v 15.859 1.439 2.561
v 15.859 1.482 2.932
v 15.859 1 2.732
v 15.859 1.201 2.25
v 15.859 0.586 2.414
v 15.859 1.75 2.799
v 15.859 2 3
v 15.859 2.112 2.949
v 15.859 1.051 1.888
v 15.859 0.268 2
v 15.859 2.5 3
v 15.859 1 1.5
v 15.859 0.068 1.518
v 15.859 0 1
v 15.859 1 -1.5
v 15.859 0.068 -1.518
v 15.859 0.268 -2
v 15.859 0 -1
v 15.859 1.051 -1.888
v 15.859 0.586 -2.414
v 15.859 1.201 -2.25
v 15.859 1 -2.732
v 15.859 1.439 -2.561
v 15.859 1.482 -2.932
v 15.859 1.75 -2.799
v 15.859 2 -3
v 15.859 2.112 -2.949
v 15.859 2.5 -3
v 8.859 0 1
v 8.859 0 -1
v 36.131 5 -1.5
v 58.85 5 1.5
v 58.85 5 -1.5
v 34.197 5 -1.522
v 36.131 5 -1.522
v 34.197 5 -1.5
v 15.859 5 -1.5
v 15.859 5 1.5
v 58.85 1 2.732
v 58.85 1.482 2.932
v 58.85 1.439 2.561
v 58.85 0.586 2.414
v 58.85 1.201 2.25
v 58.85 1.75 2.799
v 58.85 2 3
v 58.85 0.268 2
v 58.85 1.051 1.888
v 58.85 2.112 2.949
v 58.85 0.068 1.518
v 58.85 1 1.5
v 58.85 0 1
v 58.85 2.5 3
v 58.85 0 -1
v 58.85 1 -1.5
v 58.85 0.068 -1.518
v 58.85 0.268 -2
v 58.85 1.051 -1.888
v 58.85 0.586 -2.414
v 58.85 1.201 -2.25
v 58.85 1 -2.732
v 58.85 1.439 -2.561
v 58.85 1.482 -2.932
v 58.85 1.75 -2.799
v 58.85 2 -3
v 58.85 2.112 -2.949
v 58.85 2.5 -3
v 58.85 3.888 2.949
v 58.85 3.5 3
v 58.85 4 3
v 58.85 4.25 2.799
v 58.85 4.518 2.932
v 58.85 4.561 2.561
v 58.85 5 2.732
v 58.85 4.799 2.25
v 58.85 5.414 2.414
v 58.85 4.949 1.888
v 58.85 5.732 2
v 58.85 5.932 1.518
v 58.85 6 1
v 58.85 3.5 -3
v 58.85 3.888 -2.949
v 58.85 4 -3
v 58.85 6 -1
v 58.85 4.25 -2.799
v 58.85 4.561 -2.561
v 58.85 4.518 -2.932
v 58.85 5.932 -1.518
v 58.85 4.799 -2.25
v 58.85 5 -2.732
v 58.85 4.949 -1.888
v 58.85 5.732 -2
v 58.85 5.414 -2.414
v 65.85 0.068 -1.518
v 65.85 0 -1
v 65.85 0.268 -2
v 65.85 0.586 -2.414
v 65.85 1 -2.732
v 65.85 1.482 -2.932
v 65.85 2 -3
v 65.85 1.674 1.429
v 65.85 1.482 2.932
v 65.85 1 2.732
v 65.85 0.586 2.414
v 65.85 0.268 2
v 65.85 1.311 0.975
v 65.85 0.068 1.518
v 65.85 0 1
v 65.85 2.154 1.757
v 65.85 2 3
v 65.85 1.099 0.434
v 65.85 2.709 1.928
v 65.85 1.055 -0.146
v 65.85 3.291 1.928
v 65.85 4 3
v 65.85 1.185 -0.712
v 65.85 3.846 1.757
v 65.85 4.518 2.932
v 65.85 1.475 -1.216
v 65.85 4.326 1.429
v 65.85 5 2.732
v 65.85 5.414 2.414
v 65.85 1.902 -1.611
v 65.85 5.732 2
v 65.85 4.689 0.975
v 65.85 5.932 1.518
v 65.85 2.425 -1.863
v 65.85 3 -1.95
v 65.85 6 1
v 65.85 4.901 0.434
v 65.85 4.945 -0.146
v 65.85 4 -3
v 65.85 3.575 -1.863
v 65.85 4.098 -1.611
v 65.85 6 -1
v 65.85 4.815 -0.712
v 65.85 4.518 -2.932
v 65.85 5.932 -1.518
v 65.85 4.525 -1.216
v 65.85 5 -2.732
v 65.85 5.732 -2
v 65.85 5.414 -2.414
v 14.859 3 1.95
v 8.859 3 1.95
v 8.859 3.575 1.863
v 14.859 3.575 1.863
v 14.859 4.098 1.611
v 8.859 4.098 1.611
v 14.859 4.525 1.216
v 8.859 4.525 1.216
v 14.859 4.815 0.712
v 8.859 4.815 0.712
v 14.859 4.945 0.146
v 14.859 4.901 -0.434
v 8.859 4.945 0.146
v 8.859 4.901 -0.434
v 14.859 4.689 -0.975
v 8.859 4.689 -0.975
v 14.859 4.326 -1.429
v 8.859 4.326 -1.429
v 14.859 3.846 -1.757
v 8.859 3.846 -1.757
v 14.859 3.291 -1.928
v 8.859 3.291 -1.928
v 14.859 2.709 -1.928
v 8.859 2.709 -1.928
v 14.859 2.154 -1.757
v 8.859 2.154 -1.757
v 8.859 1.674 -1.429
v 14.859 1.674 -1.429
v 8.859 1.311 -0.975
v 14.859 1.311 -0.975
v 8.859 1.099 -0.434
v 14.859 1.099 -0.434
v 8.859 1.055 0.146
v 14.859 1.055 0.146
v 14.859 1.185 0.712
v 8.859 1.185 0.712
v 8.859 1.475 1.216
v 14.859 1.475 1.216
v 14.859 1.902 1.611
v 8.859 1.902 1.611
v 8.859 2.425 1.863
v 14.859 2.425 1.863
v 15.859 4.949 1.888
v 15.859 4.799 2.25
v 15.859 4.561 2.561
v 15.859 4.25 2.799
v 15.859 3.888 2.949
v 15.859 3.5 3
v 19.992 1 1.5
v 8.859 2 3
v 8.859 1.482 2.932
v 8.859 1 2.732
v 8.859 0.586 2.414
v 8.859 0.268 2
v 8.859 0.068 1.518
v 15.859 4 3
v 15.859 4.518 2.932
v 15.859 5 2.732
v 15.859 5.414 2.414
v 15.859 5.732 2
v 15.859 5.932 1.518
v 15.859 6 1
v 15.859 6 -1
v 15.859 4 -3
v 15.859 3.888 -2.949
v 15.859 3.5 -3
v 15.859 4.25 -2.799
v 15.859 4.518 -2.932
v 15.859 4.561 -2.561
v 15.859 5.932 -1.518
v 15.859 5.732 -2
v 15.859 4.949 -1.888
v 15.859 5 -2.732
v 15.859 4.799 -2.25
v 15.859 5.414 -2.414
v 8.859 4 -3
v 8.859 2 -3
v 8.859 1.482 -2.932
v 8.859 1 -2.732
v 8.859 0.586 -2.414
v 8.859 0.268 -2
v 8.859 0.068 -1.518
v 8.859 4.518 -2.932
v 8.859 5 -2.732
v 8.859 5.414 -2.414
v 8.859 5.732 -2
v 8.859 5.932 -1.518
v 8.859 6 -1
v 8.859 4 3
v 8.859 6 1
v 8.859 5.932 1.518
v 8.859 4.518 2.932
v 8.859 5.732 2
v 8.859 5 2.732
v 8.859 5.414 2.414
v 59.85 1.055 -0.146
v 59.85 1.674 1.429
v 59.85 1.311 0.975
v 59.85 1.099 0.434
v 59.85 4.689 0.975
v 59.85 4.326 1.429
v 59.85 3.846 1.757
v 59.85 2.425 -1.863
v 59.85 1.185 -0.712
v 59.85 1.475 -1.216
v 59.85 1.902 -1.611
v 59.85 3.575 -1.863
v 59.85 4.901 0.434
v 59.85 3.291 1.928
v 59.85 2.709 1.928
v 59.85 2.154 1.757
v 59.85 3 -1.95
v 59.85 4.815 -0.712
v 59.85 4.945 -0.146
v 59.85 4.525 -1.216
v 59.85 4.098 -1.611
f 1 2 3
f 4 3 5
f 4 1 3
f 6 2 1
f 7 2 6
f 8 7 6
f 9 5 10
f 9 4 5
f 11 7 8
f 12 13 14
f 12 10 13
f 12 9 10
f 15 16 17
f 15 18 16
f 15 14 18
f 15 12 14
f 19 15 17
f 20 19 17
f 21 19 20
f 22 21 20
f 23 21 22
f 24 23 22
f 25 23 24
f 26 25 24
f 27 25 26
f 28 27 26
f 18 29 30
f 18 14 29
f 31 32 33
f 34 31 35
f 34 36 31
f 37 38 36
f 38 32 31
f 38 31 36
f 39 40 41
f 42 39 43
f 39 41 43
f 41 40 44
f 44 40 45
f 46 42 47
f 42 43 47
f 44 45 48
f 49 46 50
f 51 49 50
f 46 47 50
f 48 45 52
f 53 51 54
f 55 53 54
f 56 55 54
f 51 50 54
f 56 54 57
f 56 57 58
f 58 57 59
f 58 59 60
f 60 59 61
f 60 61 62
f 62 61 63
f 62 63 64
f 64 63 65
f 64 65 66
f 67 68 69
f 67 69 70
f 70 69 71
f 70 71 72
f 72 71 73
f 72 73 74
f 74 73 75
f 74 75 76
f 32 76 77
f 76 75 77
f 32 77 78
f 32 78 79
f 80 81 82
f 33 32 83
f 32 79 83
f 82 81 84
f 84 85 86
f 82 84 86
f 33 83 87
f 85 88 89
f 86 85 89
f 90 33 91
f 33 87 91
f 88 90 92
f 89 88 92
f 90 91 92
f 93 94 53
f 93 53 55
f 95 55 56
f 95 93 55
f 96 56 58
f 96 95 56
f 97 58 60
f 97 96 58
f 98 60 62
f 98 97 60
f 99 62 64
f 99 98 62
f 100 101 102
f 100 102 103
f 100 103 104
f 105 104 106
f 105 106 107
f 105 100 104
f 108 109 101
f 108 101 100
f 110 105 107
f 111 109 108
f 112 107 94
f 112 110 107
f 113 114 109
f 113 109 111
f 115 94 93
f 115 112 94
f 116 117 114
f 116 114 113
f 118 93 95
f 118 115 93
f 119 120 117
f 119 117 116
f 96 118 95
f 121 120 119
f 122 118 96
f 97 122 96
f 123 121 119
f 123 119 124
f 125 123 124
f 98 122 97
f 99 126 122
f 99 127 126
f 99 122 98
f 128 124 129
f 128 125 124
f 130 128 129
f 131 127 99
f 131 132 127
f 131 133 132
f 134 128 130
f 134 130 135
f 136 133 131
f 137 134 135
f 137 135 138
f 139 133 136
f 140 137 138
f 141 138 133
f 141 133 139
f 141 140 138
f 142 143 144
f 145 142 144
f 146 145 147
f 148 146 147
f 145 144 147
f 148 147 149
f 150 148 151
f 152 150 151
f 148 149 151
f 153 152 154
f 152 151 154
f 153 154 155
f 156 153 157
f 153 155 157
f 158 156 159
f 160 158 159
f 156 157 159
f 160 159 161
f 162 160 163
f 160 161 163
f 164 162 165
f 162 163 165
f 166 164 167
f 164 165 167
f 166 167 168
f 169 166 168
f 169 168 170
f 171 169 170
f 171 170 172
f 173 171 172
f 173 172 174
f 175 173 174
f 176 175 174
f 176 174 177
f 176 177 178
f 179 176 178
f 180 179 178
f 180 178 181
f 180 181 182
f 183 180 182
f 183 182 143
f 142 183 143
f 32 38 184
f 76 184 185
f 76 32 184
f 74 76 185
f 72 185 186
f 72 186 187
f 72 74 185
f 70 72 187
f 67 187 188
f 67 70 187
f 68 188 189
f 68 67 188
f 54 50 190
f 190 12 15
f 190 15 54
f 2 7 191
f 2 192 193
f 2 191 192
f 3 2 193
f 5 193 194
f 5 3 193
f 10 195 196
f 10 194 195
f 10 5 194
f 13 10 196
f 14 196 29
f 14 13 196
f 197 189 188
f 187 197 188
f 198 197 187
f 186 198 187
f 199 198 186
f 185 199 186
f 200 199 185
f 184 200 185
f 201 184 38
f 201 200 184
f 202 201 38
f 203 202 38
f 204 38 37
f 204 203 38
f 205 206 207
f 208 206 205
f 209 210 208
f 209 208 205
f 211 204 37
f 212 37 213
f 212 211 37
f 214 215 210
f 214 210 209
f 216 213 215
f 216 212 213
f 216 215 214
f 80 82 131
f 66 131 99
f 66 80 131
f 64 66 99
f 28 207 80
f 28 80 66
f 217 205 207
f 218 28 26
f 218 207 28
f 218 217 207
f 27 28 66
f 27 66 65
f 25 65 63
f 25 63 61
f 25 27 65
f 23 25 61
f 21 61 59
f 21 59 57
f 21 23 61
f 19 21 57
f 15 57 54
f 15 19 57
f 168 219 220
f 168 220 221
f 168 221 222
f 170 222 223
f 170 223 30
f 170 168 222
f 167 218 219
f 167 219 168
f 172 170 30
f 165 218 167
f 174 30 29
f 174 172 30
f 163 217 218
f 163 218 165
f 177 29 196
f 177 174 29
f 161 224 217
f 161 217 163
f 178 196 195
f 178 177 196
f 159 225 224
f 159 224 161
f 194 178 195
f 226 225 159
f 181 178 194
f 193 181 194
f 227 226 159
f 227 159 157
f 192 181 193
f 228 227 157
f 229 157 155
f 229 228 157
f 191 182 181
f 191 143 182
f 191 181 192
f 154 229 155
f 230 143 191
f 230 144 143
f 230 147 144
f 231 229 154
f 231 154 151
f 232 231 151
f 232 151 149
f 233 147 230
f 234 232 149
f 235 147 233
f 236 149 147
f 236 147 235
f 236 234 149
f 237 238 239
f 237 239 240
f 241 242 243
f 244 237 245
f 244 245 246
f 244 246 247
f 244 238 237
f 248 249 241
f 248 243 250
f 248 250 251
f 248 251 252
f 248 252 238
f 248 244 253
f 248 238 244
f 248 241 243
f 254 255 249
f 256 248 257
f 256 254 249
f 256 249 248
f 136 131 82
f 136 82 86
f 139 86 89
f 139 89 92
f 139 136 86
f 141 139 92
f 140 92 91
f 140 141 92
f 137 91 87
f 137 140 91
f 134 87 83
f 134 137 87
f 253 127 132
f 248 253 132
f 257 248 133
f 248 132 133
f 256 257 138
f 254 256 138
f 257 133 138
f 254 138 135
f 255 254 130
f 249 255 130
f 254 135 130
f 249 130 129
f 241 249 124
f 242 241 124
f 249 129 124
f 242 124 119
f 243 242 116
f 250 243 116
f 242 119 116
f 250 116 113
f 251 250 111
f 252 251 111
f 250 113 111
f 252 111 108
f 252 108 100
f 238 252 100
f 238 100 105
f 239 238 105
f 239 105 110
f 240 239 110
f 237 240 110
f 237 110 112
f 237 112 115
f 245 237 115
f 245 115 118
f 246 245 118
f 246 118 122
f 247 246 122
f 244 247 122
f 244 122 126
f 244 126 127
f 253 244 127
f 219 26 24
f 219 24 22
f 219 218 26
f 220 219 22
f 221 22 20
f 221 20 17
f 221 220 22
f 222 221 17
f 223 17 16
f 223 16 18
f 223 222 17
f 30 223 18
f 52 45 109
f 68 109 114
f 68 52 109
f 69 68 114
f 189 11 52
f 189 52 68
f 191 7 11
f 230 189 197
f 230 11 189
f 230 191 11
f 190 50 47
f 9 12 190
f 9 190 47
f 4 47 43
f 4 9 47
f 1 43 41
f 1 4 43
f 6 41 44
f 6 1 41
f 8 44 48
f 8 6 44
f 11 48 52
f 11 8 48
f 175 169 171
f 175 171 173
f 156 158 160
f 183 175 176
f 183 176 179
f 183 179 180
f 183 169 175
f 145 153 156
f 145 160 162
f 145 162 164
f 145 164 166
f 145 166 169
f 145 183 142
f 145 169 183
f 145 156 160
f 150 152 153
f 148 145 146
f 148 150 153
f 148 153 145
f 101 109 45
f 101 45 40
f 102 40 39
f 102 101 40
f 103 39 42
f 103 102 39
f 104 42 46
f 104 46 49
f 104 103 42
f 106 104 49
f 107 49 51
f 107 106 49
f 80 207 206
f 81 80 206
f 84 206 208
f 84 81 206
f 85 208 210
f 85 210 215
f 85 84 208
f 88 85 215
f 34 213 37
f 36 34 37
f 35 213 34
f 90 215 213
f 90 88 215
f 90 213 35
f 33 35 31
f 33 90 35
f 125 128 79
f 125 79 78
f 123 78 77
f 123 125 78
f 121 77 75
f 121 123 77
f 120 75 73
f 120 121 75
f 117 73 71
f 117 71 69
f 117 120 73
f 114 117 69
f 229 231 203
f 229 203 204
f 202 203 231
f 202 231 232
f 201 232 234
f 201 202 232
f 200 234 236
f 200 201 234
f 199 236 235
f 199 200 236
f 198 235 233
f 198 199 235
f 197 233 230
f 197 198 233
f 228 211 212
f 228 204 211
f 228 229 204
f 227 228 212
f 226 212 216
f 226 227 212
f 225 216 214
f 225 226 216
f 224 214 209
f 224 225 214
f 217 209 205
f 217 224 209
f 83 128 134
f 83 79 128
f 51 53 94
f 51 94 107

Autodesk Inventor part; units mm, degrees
ref_plane "YZ Plane" through (0, 0, 0) normal (1, 0, 0) x (0, 1, 0)
ref_plane "XZ Plane" through (0, 0, 0) normal (0, 1, 0) x (-1, 0, 0)
ref_plane "XY Plane" through (0, 0, 0) normal (0, 0, 1) x (1, 0, 0)
sketch "Sketch1" plane through (0, 0, 0) normal (0, 1, 0) x (-1, 0, 0)
  point P0 (0, 0)
sketch "Sketch2" plane through (0, 0, 0) normal (0, 1, 0) x (-1, 0, 0)
  circle A0 centre (0, 0) radius 3.85
  dimension "d0" = 7.7
extrude "Extrusion1" add sketch "Sketch2" along normal blind 6
sketch "Sketch3" plane through (0, 6, 0) normal (0, 1, 0) x (1, 0, 0)
  circle A0 centre (0, 0) radius 1
  dimension "d3" = 2
extrude "Extrusion2" cut sketch "Sketch3" against normal through all
sketch "Sketch4" plane through (0, 0, 0) normal (0, -1, 0) x (1, 0, 0)
  circle A0 centre (0, 0) radius 3.85 projected
  line L0 (0, 3.85) -> (3.85, 3.85)
  line L1 (3.85, 3.85) -> (3.85, -3.85)
  line L2 (3.85, -3.85) -> (0, -3.85)
  line L3 (3.85, 3.85) -> (4.85, 3.85)
  line L4 (4.85, 3.85) -> (4.85, -3.85)
  line L5 (4.85, -3.85) -> (3.85, -3.85)
  line L6 (3.85, -3.85) -> (3.85, 3.85)
  line L7 (4.85, 3.85) -> (4.85, 3)
  line L8 (4.85, -3.85) -> (4.85, -3)
  line L9 (4.85, 3) -> (3.85, 3)
  line L10 (3.85, 3) -> (3.85, -3)
  line L11 (3.85, -3) -> (4.85, -3)
  line L12 (4.85, -3) -> (4.85, 3)
  point P0 (3.85, -3)
  dimension "d6" = 1
  dimension "d7" = 0.85
  dimension "d8" = 0.85
extrude "Extrusion3" add sketch "Sketch4" against normal blind 6 contours L1 L9 L4 L11
sketch "Sketch5" plane through (4.85, 0, 3) normal (1, 0, 0) x (0, 0, -1)
  line L0 (6.85, 0) -> (-0.85, 0) projected
  line L1 (6, 0) -> (6, 6) projected
  line L2 (0.0003, 0) -> (6, 0)
  line L3 (6, 0) -> (6, 1)
  line L4 (6, 1) -> (0.0003, 1)
  line L5 (0.0003, 1) -> (0.0003, 0)
  line L6 (6.85, 6) -> (-0.85, 6) projected
  line L7 (0.0003, 6) -> (6, 6)
  line L8 (6, 6) -> (6, 5)
  line L9 (6, 5) -> (0.0003, 5)
  line L10 (0.0003, 5) -> (0.0003, 6)
  point P0 (3, 0)
  point P1 (3, 6)
  dimension "d11" = 1
  dimension "d12" = 1
extrude "Extrusion4" cut sketch "Sketch5" against normal blind 1 contours L9 L10 L6 L1
extrude "Extrusion5" cut sketch "Sketch5" against normal blind 1 contours L0 L5 L4 L1
sketch "Sketch6" plane through (4.85, 5, 2.9997) normal (0, 0, -1) x (-1, 0, 0)
  line L0 (0, 0) -> (1, 0) projected
  line L1 (0, -5) -> (0, 1) projected
  line L2 (1, 0) -> (0, 0)
  line L3 (0, 0) -> (0, 1)
  line L4 (0, 1) -> (1, 1)
  line L5 (1, 1) -> (1, 0)
  line L6 (1, -5) -> (0, -5)
  line L7 (0, -5) -> (0, -3.9916)
  line L8 (0, -3.9916) -> (1, -3.9916)
  line L9 (1, -3.9916) -> (1, -5)
  point P0 (4.85, -5)
extrude "Extrusion6" cut sketch "Sketch6" against normal through all contours L1 L4 L5 L0
extrude "Extrusion7" cut sketch "Sketch6" against normal through all contours L1 L8 L9 L6
sketch "Sketch7" plane through (4.85, 5, 3) normal (1, 0, 0) x (0, 0, -1)
  line L0 (0, 0) -> (3, 0) projected
  line L1 (6, -4) -> (6, 0) projected
  line L2 (0, 0) -> (6, 0)
  line L3 (6, 0) -> (6, -4)
  line L4 (6, -4) -> (0, -4)
  line L5 (0, -4) -> (0, 0)
  point P0 (3, -5)
extrude "Extrusion8" add sketch "Sketch7" along normal blind 71
sketch "Sketch8" plane through (3.85, 1, -3) normal (0, 0, -1) x (-1, 0, 0)
  point P0 (3.85, -1)
sketch "Sketch9" plane through (3.85, 5, 0) normal (0, 1, 0) x (1, 0, 0)
  line L0 (72, 3) -> (72, -3) projected
  line L1 (72, 0) -> (75.85, 0)
  circle A0 centre (75.85, 0) radius 3.85
  point P0 (-3.85, 0)
  dimension "d23" = 3.85
extrude "Extrusion9" add sketch "Sketch9" along normal blind 1
extrude "Extrusion10" add sketch "Sketch9" against normal blind 5
sketch "Sketch10" plane through (79.7, 6, 0) normal (0, 1, 0) x (1, 0, 0)
  circle A0 centre (0, 0) radius 1.85
  point P0 (-79.7, 0)
  dimension "d28" = 3.7
extrude "Extrusion11" cut sketch "Sketch10" against normal through all
sketch "Sketch11" plane through (3.85, 5, 0) normal (-1, 0, 0) x (0, 0, 1)
  point P0 (0, -5)
sketch "Sketch12" plane through (3.85, 5, -3) normal (-1, 0, 0) x (0, 0, 1)
  line L0 (0, 0) -> (3, 0) projected
  line L1 (6, 0) -> (6, -4) projected
  line L2 (0, 0) -> (6, 0)
  line L3 (6, 0) -> (6, -4)
  line L4 (6, -4) -> (0, -4)
  line L5 (0, -4) -> (0, 0)
  point P0 (3, -5)
extrude "Extrusion12" add sketch "Sketch12" along normal blind 2
sketch "Sketch13" plane through (75.85, 5, 3) normal (1, 0, 0) x (0, 0, -1)
  line L0 (3, 0) -> (0, 0) projected
  line L1 (3, -4) -> (6, -4) projected
  line L2 (0, 0) -> (6, 0)
  line L3 (6, 0) -> (6, -4)
  line L4 (6, -4) -> (0, -4)
  line L5 (0, -4) -> (0, 0)
  point P0 (3, -5)
extrude "Extrusion13" add sketch "Sketch13" along normal blind 1.6
fillet "Fillet1" radius 1.5 2 edges at (76.5685, 5, 3) (39.1315, 5, 3)
fillet "Fillet2" radius 1.5 1 edges at (39.85, 5, -3)
fillet "Fillet3" radius 1.5 1 edges at (39.85, 1, -3)
fillet "Fillet4" radius 1.5 3 edges at (4.35, 1, 2.9997) (40.35, 1, 3) (4.85, 1, 2.9998)
sketch "Sketch14" plane through (3.5458, 5, 1.5) normal (0, 1, 0) x (1, 0, 0)
  point P0 (-3.5458, 1.5)
sketch "Sketch15" plane through (3.5458, 5, 1.5) normal (0, 1, 0) x (1, 0, 0)
  line L0 (0.4177, 2.9988) -> (2.9717, 2.9988) construction
  line L1 (2.9717, 2.9988) -> (2.9717, -0.0492) construction
  line L2 (2.9717, -0.0492) -> (0.4177, -0.0492) construction
  line L3 (0.4177, -0.0492) -> (0.4177, 2.9988) construction
  line L4 (0.398, -0.0492) -> (1.4255, 2.9988)
  line L5 (1.4255, 2.9988) -> (1.9244, 2.9988)
  line L6 (1.9244, 2.9988) -> (2.952, -0.0492)
  line L7 (2.952, -0.0492) -> (2.5247, -0.0492)
  line L8 (2.5247, -0.0492) -> (2.248, 0.803)
  line L9 (2.248, 0.803) -> (1.0846, 0.803)
  line L10 (1.0846, 0.803) -> (0.808, -0.0492)
  line L11 (0.808, -0.0492) -> (0.398, -0.0492)
  line L12 (2.1369, 1.1488) -> (1.6651, 2.5839)
  line L13 (1.6651, 2.5839) -> (1.1958, 1.1488)
  line L14 (1.1958, 1.1488) -> (2.1369, 1.1488)
  point P0 (-3.5458, 1.5)
extrude "Extrusion14" add sketch "Sketch15" along normal blind 0.2
sketch "Sketch16" plane through (3.5458, 5, -1.5) normal (0, 1, 0) x (1, 0, 0)
  line L0 (69.8363, -0.0038) -> (72.3064, -0.0038) construction
  line L1 (72.3064, -0.0038) -> (72.3064, -3.0518) construction
  line L2 (72.3064, -3.0518) -> (69.8363, -3.0518) construction
  line L3 (69.8363, -3.0518) -> (69.8363, -0.0038) construction
  spline S0 degree 2 poles (72.2125, -2.1157) (72.2125, -2.3429) (72.0396, -2.6912) (71.8963, -2.8048) knots 0 0 0 1 2 2 2
  spline S1 degree 2 poles (71.8963, -2.8048) (71.7234, -2.9382) (71.3307, -3.0518) (71.0195, -3.0518) knots 0 0 0 1 2 2 2
  line L4 (71.0195, -3.0518) -> (70.1451, -3.0518)
  line L5 (70.1451, -3.0518) -> (70.1451, -0.0038)
  line L6 (70.1451, -0.0038) -> (70.9528, -0.0038)
  spline S2 degree 2 poles (70.9528, -0.0038) (71.2788, -0.0038) (71.6049, -0.0458) (71.7531, -0.1273) knots 0 0 0 1 2 2 2
  spline S3 degree 2 poles (71.7531, -0.1273) (71.9186, -0.2138) (72.0692, -0.4978) (72.0692, -0.6905) knots 0 0 0 1 2 2 2
  spline S4 degree 2 poles (72.0692, -0.6905) (72.0692, -0.9054) (71.842, -1.2462) (71.6419, -1.3426) knots 0 0 0 1 2 2 2
  line L7 (71.6419, -1.3426) -> (71.6419, -1.3574)
  spline S5 degree 2 poles (71.6419, -1.3574) (71.9136, -1.4315) (72.2125, -1.8242) (72.2125, -2.1157) knots 0 0 0 1 2 2 2
  spline S6 degree 2 poles (71.7901, -2.133) (71.7901, -1.9601) (71.6913, -1.7378) (71.5431, -1.6587) knots 0 0 0 1 2 2 2
  spline S7 degree 2 poles (71.5431, -1.6587) (71.4468, -1.6093) (71.2195, -1.5797) (71.0096, -1.5797) knots 0 0 0 1 2 2 2
  line L8 (71.0096, -1.5797) -> (70.5502, -1.5797)
  line L9 (70.5502, -1.5797) -> (70.5502, -2.706)
  line L10 (70.5502, -2.706) -> (70.8787, -2.706)
  spline S8 degree 2 poles (70.8787, -2.706) (71.1454, -2.706) (71.4517, -2.6566) (71.5703, -2.5776) knots 0 0 0 1 2 2 2
  spline S9 degree 2 poles (71.5703, -2.5776) (71.6839, -2.4961) (71.7901, -2.2935) (71.7901, -2.133) knots 0 0 0 1 2 2 2
  spline S10 degree 2 poles (71.6469, -0.7473) (71.6469, -0.6386) (71.5728, -0.4756) (71.4912, -0.4287) knots 0 0 0 1 2 2 2
  spline S11 degree 2 poles (71.4912, -0.4287) (71.3924, -0.3743) (71.1529, -0.3496) (70.938, -0.3496) knots 0 0 0 1 2 2 2
  line L11 (70.938, -0.3496) -> (70.5502, -0.3496)
  line L12 (70.5502, -0.3496) -> (70.5502, -1.2413)
  line L13 (70.5502, -1.2413) -> (71.0096, -1.2413)
  spline S12 degree 2 poles (71.0096, -1.2413) (71.1998, -1.2413) (71.3801, -1.2018) (71.4764, -1.14) knots 0 0 0 1 2 2 2
  spline S13 degree 2 poles (71.4764, -1.14) (71.5703, -1.0807) (71.6469, -0.8905) (71.6469, -0.7473) knots 0 0 0 1 2 2 2
  point P0 (-3.5458, -1.5)
extrude "Extrusion15" add sketch "Sketch16" along normal blind 0.2
sketch "Sketch17" plane through (3.5458, 5, -1.5) normal (0, 1, 0) x (1, 0, 0)
  line L0 (0.4145, -1.5) -> (36.4145, -1.5)
  line L1 (30.4487, 0.0859) -> (55.6072, 0.0859) construction
  line L2 (55.6072, 0.0859) -> (55.6072, -2.5363) construction
  line L3 (55.6072, -2.5363) -> (30.4487, -2.5363) construction
  line L4 (30.4487, -2.5363) -> (30.4487, 0.0859) construction
  line L5 (32.5853, -0.4353) -> (31.2663, -3.0264)
  line L6 (31.2663, -3.0264) -> (30.8316, -3.0264)
  line L7 (30.8316, -3.0264) -> (32.2247, -0.3365)
  line L8 (32.2247, -0.3365) -> (30.6513, -0.3365)
  line L9 (30.6513, -0.3365) -> (30.6513, 0.0216)
  line L10 (30.6513, 0.0216) -> (32.5853, 0.0216)
  line L11 (32.5853, 0.0216) -> (32.5853, -0.4353)
  line L12 (34.838, -3.0264) -> (32.9583, -3.0264)
  line L13 (32.9583, -3.0264) -> (32.9583, -2.5941)
  spline S0 degree 2 poles (32.9583, -2.5941) (33.1608, -2.4039) (33.5214, -2.0507) (33.6943, -1.8605) knots 0 0 0 1 2 2 2
  spline S1 degree 2 poles (33.6943, -1.8605) (34.0426, -1.4777) (34.297, -1.0182) (34.297, -0.7737) knots 0 0 0 1 2 2 2
  spline S2 degree 2 poles (34.297, -0.7737) (34.297, -0.6453) (34.218, -0.4526) (34.1464, -0.3909) knots 0 0 0 1 2 2 2
  spline S3 degree 2 poles (34.1464, -0.3909) (34.0747, -0.3291) (33.887, -0.2674) (33.7734, -0.2674) knots 0 0 0 1 2 2 2
  spline S4 degree 2 poles (33.7734, -0.2674) (33.6647, -0.2674) (33.4424, -0.3217) (33.3411, -0.3637) knots 0 0 0 1 2 2 2
  spline S5 degree 2 poles (33.3411, -0.3637) (33.2547, -0.3983) (33.0941, -0.4971) (33.0447, -0.5317) knots 0 0 0 1 2 2 2
  line L14 (33.0447, -0.5317) -> (33.0225, -0.5317)
  line L15 (33.0225, -0.5317) -> (33.0225, -0.0969)
  spline S6 degree 2 poles (33.0225, -0.0969) (33.1485, -0.0352) (33.6005, 0.0859) (33.803, 0.0859) knots 0 0 0 1 2 2 2
  spline S7 degree 2 poles (33.803, 0.0859) (34.2303, 0.0859) (34.712, -0.3662) (34.712, -0.7515) knots 0 0 0 1 2 2 2
  spline S8 degree 2 poles (34.712, -0.7515) (34.712, -0.9318) (34.628, -1.2331) (34.5539, -1.3616) knots 0 0 0 1 2 2 2
  spline S9 degree 2 poles (34.5539, -1.3616) (34.4798, -1.495) (34.2649, -1.7568) (34.1464, -1.8828) knots 0 0 0 1 2 2 2
  spline S10 degree 2 poles (34.1464, -1.8828) (33.9537, -2.0927) (33.4819, -2.5422) (33.3411, -2.6732) knots 0 0 0 1 2 2 2
  line L16 (33.3411, -2.6732) -> (34.838, -2.6732)
  line L17 (34.838, -2.6732) -> (34.838, -3.0264)
  line L18 (37.8958, -3.0264) -> (37.8958, -1.7024)
  spline S11 degree 2 poles (37.8958, -1.7024) (37.8958, -1.5444) (37.8711, -1.2751) (37.8316, -1.201) knots 0 0 0 1 2 2 2
  spline S12 degree 2 poles (37.8316, -1.201) (37.7921, -1.1195) (37.6414, -1.0405) (37.5105, -1.0405) knots 0 0 0 1 2 2 2
  spline S13 degree 2 poles (37.5105, -1.0405) (37.392, -1.0405) (37.1203, -1.1862) (36.977, -1.3245) knots 0 0 0 1 2 2 2
  spline S14 degree 2 poles (36.977, -1.3245) (36.9795, -1.3591) (36.9844, -1.4554) (36.9844, -1.5197) knots 0 0 0 1 2 2 2
  line L19 (36.9844, -1.5197) -> (36.9844, -3.0264)
  line L20 (36.9844, -3.0264) -> (36.5991, -3.0264)
  line L21 (36.5991, -3.0264) -> (36.5991, -1.7024)
  spline S15 degree 2 poles (36.5991, -1.7024) (36.5991, -1.5444) (36.5744, -1.2751) (36.5349, -1.201) knots 0 0 0 1 2 2 2
  spline S16 degree 2 poles (36.5349, -1.201) (36.4953, -1.1195) (36.3447, -1.0405) (36.2138, -1.0405) knots 0 0 0 1 2 2 2
  spline S17 degree 2 poles (36.2138, -1.0405) (36.0903, -1.0405) (35.8161, -1.1961) (35.6876, -1.3171) knots 0 0 0 1 2 2 2
  line L22 (35.6876, -1.3171) -> (35.6876, -3.0264)
  line L23 (35.6876, -3.0264) -> (35.3023, -3.0264)
  line L24 (35.3023, -3.0264) -> (35.3023, -0.7391)
  line L25 (35.3023, -0.7391) -> (35.6876, -0.7391)
  line L26 (35.6876, -0.7391) -> (35.6876, -0.9911)
  spline S18 degree 2 poles (35.6876, -0.9911) (35.8383, -0.8404) (36.1347, -0.6749) (36.3126, -0.6749) knots 0 0 0 1 2 2 2
  spline S19 degree 2 poles (36.3126, -0.6749) (36.5151, -0.6749) (36.8288, -0.8602) (36.9103, -1.0701) knots 0 0 0 1 2 2 2
  spline S20 degree 2 poles (36.9103, -1.0701) (37.0857, -0.875) (37.4167, -0.6749) (37.6093, -0.6749) knots 0 0 0 1 2 2 2
  spline S21 degree 2 poles (37.6093, -0.6749) (37.7575, -0.6749) (37.9996, -0.7663) (38.0885, -0.87) knots 0 0 0 1 2 2 2
  spline S22 degree 2 poles (38.0885, -0.87) (38.1799, -0.9738) (38.2812, -1.285) (38.2812, -1.5197) knots 0 0 0 1 2 2 2
  line L27 (38.2812, -1.5197) -> (38.2812, -3.0264)
  line L28 (38.2812, -3.0264) -> (37.8958, -3.0264)
  line L29 (41.4156, -3.0264) -> (41.4156, -1.7024)
  spline S23 degree 2 poles (41.4156, -1.7024) (41.4156, -1.5444) (41.3909, -1.2751) (41.3514, -1.201) knots 0 0 0 1 2 2 2
  spline S24 degree 2 poles (41.3514, -1.201) (41.3119, -1.1195) (41.1612, -1.0405) (41.0303, -1.0405) knots 0 0 0 1 2 2 2
  spline S25 degree 2 poles (41.0303, -1.0405) (40.9117, -1.0405) (40.64, -1.1862) (40.4968, -1.3245) knots 0 0 0 1 2 2 2
  spline S26 degree 2 poles (40.4968, -1.3245) (40.4992, -1.3591) (40.5042, -1.4554) (40.5042, -1.5197) knots 0 0 0 1 2 2 2
  line L30 (40.5042, -1.5197) -> (40.5042, -3.0264)
  line L31 (40.5042, -3.0264) -> (40.1189, -3.0264)
  line L32 (40.1189, -3.0264) -> (40.1189, -1.7024)
  spline S27 degree 2 poles (40.1189, -1.7024) (40.1189, -1.5444) (40.0942, -1.2751) (40.0546, -1.201) knots 0 0 0 1 2 2 2
  spline S28 degree 2 poles (40.0546, -1.201) (40.0151, -1.1195) (39.8644, -1.0405) (39.7335, -1.0405) knots 0 0 0 1 2 2 2
  spline S29 degree 2 poles (39.7335, -1.0405) (39.61, -1.0405) (39.3359, -1.1961) (39.2074, -1.3171) knots 0 0 0 1 2 2 2
  line L33 (39.2074, -1.3171) -> (39.2074, -3.0264)
  line L34 (39.2074, -3.0264) -> (38.8221, -3.0264)
  line L35 (38.8221, -3.0264) -> (38.8221, -0.7391)
  line L36 (38.8221, -0.7391) -> (39.2074, -0.7391)
  line L37 (39.2074, -0.7391) -> (39.2074, -0.9911)
  spline S30 degree 2 poles (39.2074, -0.9911) (39.3581, -0.8404) (39.6545, -0.6749) (39.8323, -0.6749) knots 0 0 0 1 2 2 2
  spline S31 degree 2 poles (39.8323, -0.6749) (40.0349, -0.6749) (40.3486, -0.8602) (40.4301, -1.0701) knots 0 0 0 1 2 2 2
  spline S32 degree 2 poles (40.4301, -1.0701) (40.6054, -0.875) (40.9364, -0.6749) (41.1291, -0.6749) knots 0 0 0 1 2 2 2
  spline S33 degree 2 poles (41.1291, -0.6749) (41.2773, -0.6749) (41.5194, -0.7663) (41.6083, -0.87) knots 0 0 0 1 2 2 2
  spline S34 degree 2 poles (41.6083, -0.87) (41.6997, -0.9738) (41.8009, -1.285) (41.8009, -1.5197) knots 0 0 0 1 2 2 2
  line L38 (41.8009, -1.5197) -> (41.8009, -3.0264)
  line L39 (41.8009, -3.0264) -> (41.4156, -3.0264)
  point P0 (-3.5458, -1.5)
  dimension "d43" = 36
extrude "Extrusion16" add sketch "Sketch17" along normal blind 0.2
sketch "Sketch18" plane through (3.5458, 5.2, -1.5) normal (0, 1, 0) x (1, 0, 0)
  line L0 (29.8828, 2.0952) -> (43.3392, 2.0952)
  line L1 (43.3392, 2.0952) -> (43.3392, -5.5663)
  line L2 (43.3392, -5.5663) -> (29.8828, -5.5663)
  line L3 (29.8828, -5.5663) -> (29.8828, 2.0952)
  point P0 (-3.5458, -1.5)
extrude "Extrusion17" cut sketch "Sketch18" against normal blind 0.2
sketch "Sketch19" plane through (3.5458, 5.2, 1.5) normal (0, 1, 0) x (1, 0, 0)
  line L0 (0.3624, -0.1736) -> (3.3783, -0.1736)
  line L1 (3.3783, -0.1736) -> (3.3783, 3.2897)
  line L2 (3.3783, 3.2897) -> (0.3624, 3.2897)
  line L3 (0.3624, 3.2897) -> (0.3624, -0.1736)
  line L4 (72.2697, -0.5369) -> (69.8008, -0.5369)
  line L5 (69.8008, -0.5369) -> (69.8008, 3.7021)
  line L6 (69.8008, 3.7021) -> (72.2697, 3.7021)
  line L7 (72.2697, 3.7021) -> (72.2697, -0.5369)
  point P0 (-3.5458, 1.5)
extrude "Extrusion18" cut sketch "Sketch19" against normal blind 0.2 contours L3 L2 L1 L0
extrude "Extrusion19" cut sketch "Sketch19" against normal blind 0.2 contours L4 L5 L6 L7
sketch "Sketch20" plane through (79.7, 0, 0) normal (0, -1, 0) x (1, 0, 0)
  point P0 (-79.7, 0)
sketch "Sketch21" plane through (79.7, 6, 0) normal (0, 1, 0) x (1, 0, 0)
  circle A0 centre (0, 0) radius 1.95
  point P0 (-79.7, 0)
  dimension "d52" = 3.9
extrude "Extrusion20" cut sketch "Sketch21" against normal through all
sketch "Sketch22" plane through (0, 6, 0) normal (0, 1, 0) x (1, 0, 0)
  line L0 (0, 0) -> (0, -3.85)
  circle A0 centre (0, 0) radius 3.85 projected
  line L1 (0, -3.85) -> (3.85, -3.85)
  line L2 (3.85, -3.85) -> (-3.85, -3.85)
  line L3 (-3.85, -3.85) -> (-3.85, 3.85)
  line L4 (-3.85, 3.85) -> (3.85, 3.85)
  line L5 (3.85, 3.85) -> (3.85, -3.85)
extrude "Extrusion21" cut sketch "Sketch22" against normal through all contours A0
sketch "Sketch23" plane through (79.7, 5, 0) normal (0, 1, 0) x (1, 0, 0)
  arc A0 (-76.1542, -1.5) -> (-76.1542, 1.5) centre (-79.7, 0) ccw projected
  line L0 (-75.85, 0) -> (-77.9753, 0)
  line L1 (-77.9753, 0) -> (-77.9753, 3.5992)
  line L2 (-77.9753, 3.5992) -> (-75.85, 3.5992)
  line L3 (-75.85, 3.5992) -> (-75.85, 0)
  line L4 (-75.85, 0) -> (-77.9753, 0)
  line L5 (-77.9753, 0) -> (-77.9753, -3.4561)
  line L6 (-77.9753, -3.4561) -> (-75.85, -3.4561)
  line L7 (-75.85, -3.4561) -> (-75.85, 0)
  line L8 (-75.85, -3.4561) -> (-65.85, -3.4561)
  line L9 (-65.85, -3.4561) -> (-65.85, 3.5992)
  line L10 (-65.85, 3.5992) -> (-75.85, 3.5992)
  line L11 (-75.85, 3.5992) -> (-75.85, -3.4561)
  dimension "d57" = 10
extrude "Extrusion22" cut sketch "Sketch23" against normal through all contours L3 L10 L9 L8 L7
extrude "Extrusion23" cut sketch "Sketch23" against normal through all contours L7 L6 L5 L0
extrude "Extrusion24" cut sketch "Sketch23" against normal through all contours L0 L1 L2 L3
sketch "Sketch24" plane through (13.85, 5, -1.5) normal (-1, 0, 0) x (0, 0, 1)
  line L0 (-2.9013, -5) -> (5.7799, -5)
  line L1 (5.7799, -5) -> (5.7799, 1.344)
  line L2 (5.7799, 1.344) -> (-2.9013, 1.344)
  line L3 (-2.9013, 1.344) -> (-2.9013, -5)
  point P0 (1.5, -5)
extrude "Extrusion25" cut sketch "Sketch24" against normal blind 6.142
sketch "Sketch25" plane through (19.992, 5, -1.5) normal (-1, 0, 0) x (0, 0, 1)
  line L0 (-1.5, 0) -> (4.5, 0)
  line L1 (4.5, 0) -> (4.5, -4)
  line L2 (4.5, -4) -> (-1.5, -4)
  line L3 (-1.5, -4) -> (-1.5, 0)
  point P0 (1.5, -5)
  dimension "d66" = 6
  dimension "d67" = 4
extrude "Extrusion26" add sketch "Sketch25" along normal blind 6.133
sketch "Sketch26" plane through (79.7, 6, 0) normal (0, 1, 0) x (1, 0, 0)
  line L0 (-65.841, -3) -> (-65.841, 3) projected
  line L1 (-65.841, 0) -> (-69.691, 0)
  circle A0 centre (-69.691, 0) radius 3.85
  point P0 (-79.7, 0)
  dimension "d70" = 3.85
extrude "Extrusion27" add sketch "Sketch26" against normal blind 6
sketch "Sketch27" plane through (13.859, 5, -1.5) normal (-1, 0, 0) x (0, 0, 1)
  point P0 (1.5, -5)
sketch "Sketch28" plane through (13.859, 5, -1.5) normal (-1, 0, 0) x (0, 0, 1)
  line L0 (-1.5, 0) -> (-1.5, -4) projected
  line L1 (4.5, 0) -> (3, 0) projected
  line L2 (-1.5, -4) -> (4.5, -4)
  line L3 (4.5, -4) -> (4.5, 0)
  line L4 (4.5, 0) -> (-1.5, 0)
  line L5 (-1.5, 0) -> (-1.5, -4)
  point P0 (1.5, -5)
extrude "Extrusion28" add sketch "Sketch28" along normal blind 5
sketch "Sketch29" plane through (19.992, 3.5, 3) normal (0, 0, 1) x (1, 0, 0)
  point P0 (-19.992, -3.5)
sketch "Sketch30" plane through (79.7, 5, 0) normal (0, 1, 0) x (1, 0, 0)
  point P0 (-79.7, 0)
sketch "Sketch31" plane through (19.992, 5, -1.5) normal (1, 0, 0) x (0, 0, -1)
  arc A0 (-3, 0) -> (-4.5, -1.5) centre (-3, -1.5) ccw projected
  circle A1 centre (-3, -1.5) radius 1.5
  circle A2 centre (-3, -1.5) radius 1.5
  arc A3 (-4.5, -2.5) -> (-3, -4) centre (-3, -2.5) ccw projected
  circle A4 centre (-3, -2.5) radius 1.5
  arc A5 (0, -4) -> (1.5, -2.5) centre (0, -2.5) ccw projected
  circle A6 centre (0, -2.5) radius 1.5
  arc A7 (1.5, -1.5) -> (0, 0) centre (0, -1.5) ccw projected
  circle A8 centre (0, -1.5) radius 1.5
  line L0 (-4.5, -1.5) -> (-4.5, 0) projected
  line L1 (-4.5, 0) -> (-3, 0)
  line L2 (-3, 0) -> (-3, -1.5)
  line L3 (-3, -1.5) -> (-4.5, -1.5)
  line L4 (-4.5, -1.5) -> (-4.5, 0)
  line L5 (0, 0) -> (1.5, 0)
  line L6 (1.5, 0) -> (1.5, -1.5)
  line L7 (1.5, -1.5) -> (0, -1.5)
  line L8 (0, -1.5) -> (0, 0)
  line L9 (-3, -4) -> (-4.5, -4)
  line L10 (-4.5, -4) -> (-4.5, -2.5)
  line L11 (-4.5, -2.5) -> (-3, -2.5)
  line L12 (-3, -2.5) -> (-3, -4)
  line L13 (0, -4) -> (1.5, -4)
  line L14 (1.5, -4) -> (1.5, -2.5)
  line L15 (1.5, -2.5) -> (0, -2.5)
  line L16 (0, -2.5) -> (0, -4)
  point P0 (-1.5, -5)
extrude "Extrusion29" cut sketch "Sketch31" against normal blind 10 contours A0 L0 L1
extrude "Extrusion30" cut sketch "Sketch31" against normal blind 10 contours A3 L9 L10
extrude "Extrusion31" cut sketch "Sketch31" against normal blind 10 contours A5 L14 L13
extrude "Extrusion32" cut sketch "Sketch31" against normal blind 10 contours L5 L6 A7
sketch "Sketch32" plane through (79.7, 6, 0) normal (0, 1, 0) x (1, 0, 0)
  point P0 (-79.7, 0)
sketch "Sketch33" plane through (10.009, 6, 0) normal (0, 1, 0) x (1, 0, 0)
  circle A0 centre (0, 0) radius 3.85
  point P0 (-10.009, 0)
extrude "Extrusion33" add sketch "Sketch33" against normal blind 6
sketch "Sketch34" plane through (10.009, 6, 0) normal (0, 1, 0) x (1, 0, 0)
  circle A0 centre (0, 0) radius 1.925
  point P0 (-10.009, 0)
  dimension "d85" = 3.85
extrude "Extrusion34" cut sketch "Sketch34" against normal blind 6
sketch "Sketch35" plane through (10.009, 6, 0) normal (0, 1, 0) x (1, 0, 0)
  point P0 (-10.009, 0)
sketch "Sketch36" plane through (79.7, 6, 0) normal (0, 1, 0) x (1, 0, 0)
  point P0 (-79.7, 0)
sketch "Sketch37" plane through (79.7, 6, 0) normal (0, 1, 0) x (1, 0, 0)
  point P0 (-79.7, 0)
sketch "Sketch38" plane through (10.009, 6, 0) normal (0, 1, 0) x (1, 0, 0)
  circle A0 centre (0, 0) radius 1.95
  point P0 (-10.009, 0)
  dimension "d89" = 3.9
extrude "Extrusion35" cut sketch "Sketch38" against normal blind 6
sketch "Sketch39" plane through (79.7, 6, 0) normal (0, 1, 0) x (1, 0, 0)
  point P0 (-79.7, 0)
sketch "Sketch40" plane through (79.7, 6, 0) normal (0, 1, 0) x (1, 0, 0)
  point P0 (-79.7, 0)
sketch "Sketch41" plane through (79.7, 6, 0) normal (0, 1, 0) x (1, 0, 0)
  point P0 (-79.7, 0)
sketch "Sketch42" plane through (79.7, 6, 0) normal (0, 1, 0) x (1, 0, 0)
  circle A0 centre (0, 0) radius 3
  arc A1 (-66.1452, -1.5) -> (-66.1452, 1.5) centre (-69.691, 0) ccw projected
  circle A2 centre (-69.691, 0) radius 3
  point P0 (-79.7, 0)
  dimension "d92" = 6
  dimension "d93" = 6
extrude "Extrusion36" cut sketch "Sketch42" against normal through all contours A0
extrude "Extrusion37" cut sketch "Sketch42" against normal through all contours A2
sketch "Sketch43" plane through (10.009, 0, 0) normal (0, -1, 0) x (1, 0, 0)
  circle A0 centre (0, 0) radius 3.85 projected
  line L0 (0, 3.85) -> (-5, 3.85)
  line L1 (-5, 3.85) -> (-5, -3.85)
  line L2 (-5, -3.85) -> (0, -3.85)
  line L3 (0, -3.85) -> (0, 3.85)
  line L4 (-5, 3.85) -> (-4.5, 3.85)
  line L5 (-4.5, 3.85) -> (-4.5, -3.85)
  line L6 (-4.5, -3.85) -> (-5, -3.85)
  line L7 (-5, -3.85) -> (-5, 3.85)
  point P0 (-10.009, 0)
  dimension "d98" = 5
  dimension "d99" = 0.5
extrude "Extrusion38" add sketch "Sketch43" against normal blind 1 contours L5 L2 L1 L0
sketch "Sketch44" plane through (5.009, 0, -3.85) normal (-1, 0, 0) x (0, 0, 1)
  point P0 (3.85, 0)
sketch "Sketch45" plane through (5.009, 0, -3.85) normal (-1, 0, 0) x (0, 0, 1)
  line L0 (7.7, 1) -> (0, 1) projected
  line L1 (0, 0) -> (7.7, 0) projected
  line L2 (0, 1) -> (7.7, 1)
  line L3 (7.7, 1) -> (7.7, 0)
  line L4 (7.7, 0) -> (0, 0)
  line L5 (0, 0) -> (0, 1)
  point P0 (3.85, 0)
extrude "Extrusion39" cut sketch "Sketch45" against normal through all
sketch "Sketch46" plane through (10.009, 6, 0) normal (0, 1, 0) x (1, 0, 0)
  circle A0 centre (0, 0) radius 3.85 projected
  line L0 (0, 3.85) -> (-5, 3.85)
  line L1 (-5, 3.85) -> (-5, -3.85)
  line L2 (-5, -3.85) -> (0, -3.85)
  line L3 (0, -3.85) -> (0, 3.85)
  line L4 (-5, 3.85) -> (-4.5, 3.85)
  line L5 (-4.5, 3.85) -> (-4.5, -3.85)
  line L6 (-4.5, -3.85) -> (-5, -3.85)
  line L7 (-5, -3.85) -> (-5, 3.85)
  point P0 (-10.009, 0)
  dimension "d104" = 5
  dimension "d105" = 0.5
extrude "Extrusion40" add sketch "Sketch46" against normal blind 1 contours L5 L2 L1 L0
sketch "Sketch47" plane through (5.009, 6, -3.85) normal (-1, 0, 0) x (0, 0, 1)
  line L0 (0, 0) -> (0, -1) projected
  line L1 (0, -1) -> (7.7, -1) projected
  line L2 (0, 0) -> (7.7, 0)
  line L3 (7.7, 0) -> (7.7, -1)
  line L4 (7.7, -1) -> (0, -1)
  line L5 (0, -1) -> (0, 0)
  point P0 (3.85, -6)
extrude "Extrusion41" cut sketch "Sketch47" against normal through all
sketch "Sketch48" plane through (12.422, 2.5, 3) normal (0, 0, 1) x (1, 0, 0)
  line L0 (1.1328, 2.5) -> (63.7322, 2.5) projected
  line L1 (1.1328, -1.5) -> (63.7322, -1.5) projected
  line L2 (63.7322, 2.5) -> (63.7322, -1.5)
  line L3 (63.7322, 2.5) -> (71.128, 2.5) projected
  line L4 (71.128, 2.5) -> (63.7322, -1.5)
  line L5 (63.7322, 2.5) -> (71.128, -1.5)
  line L6 (71.128, -1.5) -> (71.128, 2.5) projected
  circle A0 centre (67.4301, 0.5) radius 4.2041
  line L7 (67.4301, 0.5) -> (67.4301, -1.5)
  line L8 (64.278, -1.5) -> (70.278, -1.5) projected
  line L9 (70.278, 2.5) -> (70.278, -1.5) projected
  line L10 (71.128, 0.6263) -> (70.278, 0.6263)
  line L11 (63.7322, 0.5) -> (64.5822, 0.5)
  line L12 (64.5822, 2.5) -> (64.5822, -1.5)
  line L13 (70.278, 2.5) -> (70.278, -1.5)
  line L14 (64.5822, 2.5) -> (70.278, -1.5)
  line L15 (70.278, 2.5) -> (64.5822, -1.5)
  circle A1 centre (67.4301, 0.5) radius 3.48
  line L16 (63.7322, 2.5) -> (71.128, 2.5)
  point P0 (-12.422, -2.5)
  dimension "d110" = 4
  dimension "d111" = 0.85
extrude "Extrusion42" add sketch "Sketch48" against normal blind 6 contours A0 L3 A1
sketch "Sketch49" plane through (12.422, 2.5, 3) normal (0, 0, 1) x (1, 0, 0)
  line L0 (71.128, 2.5) -> (61.853, 2.5)
  line L1 (61.853, 2.5) -> (61.853, 6.3445)
  line L2 (61.853, 6.3445) -> (71.128, 6.3445)
  line L3 (71.128, 6.3445) -> (71.128, 2.5)
  point P0 (-12.422, -2.5)
extrude "Extrusion43" cut sketch "Sketch49" against normal through all
sketch "Sketch50" plane through (79.7, 5, 0) normal (0, 1, 0) x (1, 0, 0)
  arc A0 (-3.5458, -1.5) -> (-3.5458, 1.5) centre (0, 0) ccw projected
  line L0 (0, -3.85) -> (3.85, -3.85)
  circle A1 centre (0, 0) radius 3.85
  line L1 (0, 3.85) -> (-3.85, 3.85)
  line L2 (-3.85, 3.85) -> (3.85, 3.85)
  line L3 (3.85, 3.85) -> (3.85, -3.85)
  line L4 (3.85, -3.85) -> (-3.85, -3.85)
  line L5 (-3.85, -3.85) -> (-3.85, 3.85)
  circle A2 centre (-69.691, 0) radius 3 projected
  arc A3 (-66.1452, 1.5) -> (-66.1452, -1.5) centre (-69.691, 0) ccw projected
  circle A4 centre (-69.691, 0) radius 3.85
  line L6 (-69.691, 3.85) -> (-73.541, 3.85)
  line L7 (-73.541, 3.85) -> (-65.841, 3.85)
  line L8 (-65.841, 3.85) -> (-65.841, -3.85)
  line L9 (-65.841, -3.85) -> (-73.541, -3.85)
  line L10 (-73.541, -3.85) -> (-73.541, 3.85)
  point P0 (-79.7, 0)
  point P1 (-3.85, 0)
  point P2 (-3.5458, -1.5)
  point P3 (-3.5458, 1.5)
  point P4 (-69.691, -3.85)
  point P5 (-65.841, 0)
  point P6 (-66.1452, -1.5)
extrude "Extrusion44" cut sketch "Sketch50" against normal blind 10 contours A0 L4 L5 A1
extrude "Extrusion45" cut sketch "Sketch50" against normal blind 10 contours L5 L1 A0 A1
extrude "Extrusion46" cut sketch "Sketch50" against normal blind 10 contours A1 A0
extrude "Extrusion47" cut sketch "Sketch50" against normal blind 10 contours L8 L9 A3 A4
extrude "Extrusion48" cut sketch "Sketch50" against normal blind 10 contours A3 L7 L8 A4
extrude "Extrusion49" cut sketch "Sketch50" against normal blind 10 contours A4 A3
sketch "Sketch51" plane through (75.85, 5, 1.5) normal (1, 0, 0) x (0, 0, -1)
  line L0 (-1.5, 0) -> (4.5, 0)
  line L1 (4.5, 0) -> (4.5, -5)
  line L2 (4.5, -5) -> (-1.5, -5)
  line L3 (-1.5, -5) -> (-1.5, 0)
  line L4 (-1.5, 0) -> (4.5, 0)
  line L5 (4.5, 0) -> (4.5, 1)
  line L6 (4.5, 1) -> (-1.5, 1)
  line L7 (-1.5, 1) -> (-1.5, 0)
  point P0 (1.5, -5)
  point P1 (4.5, 0)
  dimension "d128" = 5
  dimension "d129" = 1
extrude "Extrusion50" add sketch "Sketch51" along normal blind 5 contours L0 L1 L2 L3
extrude "Extrusion51" add sketch "Sketch51" along normal blind 5 contours L7 L6 L5 L0
sketch "Sketch52" plane through (13.859, 5, -1.5) normal (-1, 0, 0) x (0, 0, 1)
  line L0 (-1.5, -5) -> (-1.5, 1) projected
  line L1 (4.5, -5) -> (-1.5, -5) projected
  line L2 (-1.5, 1) -> (4.5, 1)
  line L3 (4.5, 1) -> (4.5, -5)
  line L4 (4.5, -5) -> (-1.5, -5)
  line L5 (-1.5, -5) -> (-1.5, 1)
  point P0 (1.5, -5)
extrude "Extrusion52" add sketch "Sketch52" along normal blind 5
sketch "Sketch53" plane through (13.859, 5, -1.5) normal (1, 0, 0) x (0, 0, -1)
  line L0 (-4.5, 1) -> (-4.5, -1.5) projected
  line L1 (1.5, -5) -> (1.5, -2.5) projected
  line L2 (-4.5, 1) -> (1.5, 1)
  line L3 (1.5, 1) -> (1.5, -5)
  line L4 (1.5, -5) -> (-4.5, -5)
  line L5 (-4.5, -5) -> (-4.5, 1)
  point P0 (-1.5, -5)
extrude "Extrusion53" add sketch "Sketch53" along normal blind 2
sketch "Sketch54" plane through (75.85, 5, 1.5) normal (-1, 0, 0) x (0, 0, 1)
  line L0 (-4.5, -5) -> (1.5, -5) projected
  line L1 (1.5, 1) -> (-4.5, 1) projected
  line L2 (-4.5, -5) -> (1.5, -5)
  line L3 (1.5, -5) -> (1.5, 1)
  line L4 (1.5, 1) -> (-4.5, 1)
  line L5 (-4.5, 1) -> (-4.5, -5)
  point P0 (-1.5, -5)
extrude "Extrusion54" add sketch "Sketch54" along normal blind 2
sketch "Sketch55" plane through (80.85, 5, 1.5) normal (1, 0, 0) x (0, 0, -1)
  circle A0 centre (1.5, -2) radius 1.95
  point P0 (1.5, -5)
  dimension "d140" = 3.9
extrude "Extrusion55" cut sketch "Sketch55" against normal blind 6
sketch "Sketch56" plane through (8.859, 5, -1.5) normal (-1, 0, 0) x (0, 0, 1)
  circle A0 centre (1.5, -2) radius 1.95
  point P0 (1.5, -5)
  dimension "d143" = 3.9
extrude "Extrusion56" cut sketch "Sketch56" against normal blind 6
fillet "Fillet5" radius 2 4 edges at (12.359, 6, 3) (12.359, 0, 3) (12.359, 6, -3) (12.359, 0, -3)
fillet "Fillet6" radius 2 4 edges at (77.35, 6, 3) (77.35, 6, -3) (77.35, 0, -3) (77.35, 0, 3)
sketch "Sketch57" plane through (80.85, 5, 1.5) normal (1, 0, 0) x (0, 0, -1)
  line L0 (-1.5, 1) -> (4.5, 1)
  line L1 (4.5, 1) -> (4.5, -5)
  line L2 (4.5, -5) -> (-1.5, -5)
  line L3 (-1.5, -5) -> (-1.5, 1)
  point P0 (1.5, -5)
  dimension "d148" = 6
  dimension "d149" = 6
extrude "Extrusion57" cut sketch "Sketch57" against normal blind 22
sketch "Sketch58" plane through (58.85, 5, 1.5) normal (1, 0, 0) x (0, 0, -1)
  line L0 (-1.5, 1) -> (4.5, 1)
  line L1 (4.5, 1) -> (4.5, -5)
  line L2 (4.5, -5) -> (-1.5, -5)
  line L3 (-1.5, -5) -> (-1.5, 1)
  point P0 (1.5, -5)
  dimension "d152" = 6
extrude "Extrusion58" add sketch "Sketch58" along normal blind 7
sketch "Sketch59" plane through (65.85, 5, 1.5) normal (1, 0, 0) x (0, 0, -1)
  circle A0 centre (1.5, -2) radius 1.95
  point P0 (1.5, -5)
  dimension "d155" = 3.9
extrude "Extrusion59" cut sketch "Sketch59" against normal blind 6
fillet "Fillet7" radius 2 1 edges at (62.35, 6, 3)
fillet "Fillet8" radius 2 1 edges at (62.35, 0, 3)
fillet "Fillet9" radius 2 1 edges at (62.35, 0, -3)
fillet "Fillet10" radius 2 1 edges at (62.35, 6, -3)
properties part number "Part3_3DPrint"
